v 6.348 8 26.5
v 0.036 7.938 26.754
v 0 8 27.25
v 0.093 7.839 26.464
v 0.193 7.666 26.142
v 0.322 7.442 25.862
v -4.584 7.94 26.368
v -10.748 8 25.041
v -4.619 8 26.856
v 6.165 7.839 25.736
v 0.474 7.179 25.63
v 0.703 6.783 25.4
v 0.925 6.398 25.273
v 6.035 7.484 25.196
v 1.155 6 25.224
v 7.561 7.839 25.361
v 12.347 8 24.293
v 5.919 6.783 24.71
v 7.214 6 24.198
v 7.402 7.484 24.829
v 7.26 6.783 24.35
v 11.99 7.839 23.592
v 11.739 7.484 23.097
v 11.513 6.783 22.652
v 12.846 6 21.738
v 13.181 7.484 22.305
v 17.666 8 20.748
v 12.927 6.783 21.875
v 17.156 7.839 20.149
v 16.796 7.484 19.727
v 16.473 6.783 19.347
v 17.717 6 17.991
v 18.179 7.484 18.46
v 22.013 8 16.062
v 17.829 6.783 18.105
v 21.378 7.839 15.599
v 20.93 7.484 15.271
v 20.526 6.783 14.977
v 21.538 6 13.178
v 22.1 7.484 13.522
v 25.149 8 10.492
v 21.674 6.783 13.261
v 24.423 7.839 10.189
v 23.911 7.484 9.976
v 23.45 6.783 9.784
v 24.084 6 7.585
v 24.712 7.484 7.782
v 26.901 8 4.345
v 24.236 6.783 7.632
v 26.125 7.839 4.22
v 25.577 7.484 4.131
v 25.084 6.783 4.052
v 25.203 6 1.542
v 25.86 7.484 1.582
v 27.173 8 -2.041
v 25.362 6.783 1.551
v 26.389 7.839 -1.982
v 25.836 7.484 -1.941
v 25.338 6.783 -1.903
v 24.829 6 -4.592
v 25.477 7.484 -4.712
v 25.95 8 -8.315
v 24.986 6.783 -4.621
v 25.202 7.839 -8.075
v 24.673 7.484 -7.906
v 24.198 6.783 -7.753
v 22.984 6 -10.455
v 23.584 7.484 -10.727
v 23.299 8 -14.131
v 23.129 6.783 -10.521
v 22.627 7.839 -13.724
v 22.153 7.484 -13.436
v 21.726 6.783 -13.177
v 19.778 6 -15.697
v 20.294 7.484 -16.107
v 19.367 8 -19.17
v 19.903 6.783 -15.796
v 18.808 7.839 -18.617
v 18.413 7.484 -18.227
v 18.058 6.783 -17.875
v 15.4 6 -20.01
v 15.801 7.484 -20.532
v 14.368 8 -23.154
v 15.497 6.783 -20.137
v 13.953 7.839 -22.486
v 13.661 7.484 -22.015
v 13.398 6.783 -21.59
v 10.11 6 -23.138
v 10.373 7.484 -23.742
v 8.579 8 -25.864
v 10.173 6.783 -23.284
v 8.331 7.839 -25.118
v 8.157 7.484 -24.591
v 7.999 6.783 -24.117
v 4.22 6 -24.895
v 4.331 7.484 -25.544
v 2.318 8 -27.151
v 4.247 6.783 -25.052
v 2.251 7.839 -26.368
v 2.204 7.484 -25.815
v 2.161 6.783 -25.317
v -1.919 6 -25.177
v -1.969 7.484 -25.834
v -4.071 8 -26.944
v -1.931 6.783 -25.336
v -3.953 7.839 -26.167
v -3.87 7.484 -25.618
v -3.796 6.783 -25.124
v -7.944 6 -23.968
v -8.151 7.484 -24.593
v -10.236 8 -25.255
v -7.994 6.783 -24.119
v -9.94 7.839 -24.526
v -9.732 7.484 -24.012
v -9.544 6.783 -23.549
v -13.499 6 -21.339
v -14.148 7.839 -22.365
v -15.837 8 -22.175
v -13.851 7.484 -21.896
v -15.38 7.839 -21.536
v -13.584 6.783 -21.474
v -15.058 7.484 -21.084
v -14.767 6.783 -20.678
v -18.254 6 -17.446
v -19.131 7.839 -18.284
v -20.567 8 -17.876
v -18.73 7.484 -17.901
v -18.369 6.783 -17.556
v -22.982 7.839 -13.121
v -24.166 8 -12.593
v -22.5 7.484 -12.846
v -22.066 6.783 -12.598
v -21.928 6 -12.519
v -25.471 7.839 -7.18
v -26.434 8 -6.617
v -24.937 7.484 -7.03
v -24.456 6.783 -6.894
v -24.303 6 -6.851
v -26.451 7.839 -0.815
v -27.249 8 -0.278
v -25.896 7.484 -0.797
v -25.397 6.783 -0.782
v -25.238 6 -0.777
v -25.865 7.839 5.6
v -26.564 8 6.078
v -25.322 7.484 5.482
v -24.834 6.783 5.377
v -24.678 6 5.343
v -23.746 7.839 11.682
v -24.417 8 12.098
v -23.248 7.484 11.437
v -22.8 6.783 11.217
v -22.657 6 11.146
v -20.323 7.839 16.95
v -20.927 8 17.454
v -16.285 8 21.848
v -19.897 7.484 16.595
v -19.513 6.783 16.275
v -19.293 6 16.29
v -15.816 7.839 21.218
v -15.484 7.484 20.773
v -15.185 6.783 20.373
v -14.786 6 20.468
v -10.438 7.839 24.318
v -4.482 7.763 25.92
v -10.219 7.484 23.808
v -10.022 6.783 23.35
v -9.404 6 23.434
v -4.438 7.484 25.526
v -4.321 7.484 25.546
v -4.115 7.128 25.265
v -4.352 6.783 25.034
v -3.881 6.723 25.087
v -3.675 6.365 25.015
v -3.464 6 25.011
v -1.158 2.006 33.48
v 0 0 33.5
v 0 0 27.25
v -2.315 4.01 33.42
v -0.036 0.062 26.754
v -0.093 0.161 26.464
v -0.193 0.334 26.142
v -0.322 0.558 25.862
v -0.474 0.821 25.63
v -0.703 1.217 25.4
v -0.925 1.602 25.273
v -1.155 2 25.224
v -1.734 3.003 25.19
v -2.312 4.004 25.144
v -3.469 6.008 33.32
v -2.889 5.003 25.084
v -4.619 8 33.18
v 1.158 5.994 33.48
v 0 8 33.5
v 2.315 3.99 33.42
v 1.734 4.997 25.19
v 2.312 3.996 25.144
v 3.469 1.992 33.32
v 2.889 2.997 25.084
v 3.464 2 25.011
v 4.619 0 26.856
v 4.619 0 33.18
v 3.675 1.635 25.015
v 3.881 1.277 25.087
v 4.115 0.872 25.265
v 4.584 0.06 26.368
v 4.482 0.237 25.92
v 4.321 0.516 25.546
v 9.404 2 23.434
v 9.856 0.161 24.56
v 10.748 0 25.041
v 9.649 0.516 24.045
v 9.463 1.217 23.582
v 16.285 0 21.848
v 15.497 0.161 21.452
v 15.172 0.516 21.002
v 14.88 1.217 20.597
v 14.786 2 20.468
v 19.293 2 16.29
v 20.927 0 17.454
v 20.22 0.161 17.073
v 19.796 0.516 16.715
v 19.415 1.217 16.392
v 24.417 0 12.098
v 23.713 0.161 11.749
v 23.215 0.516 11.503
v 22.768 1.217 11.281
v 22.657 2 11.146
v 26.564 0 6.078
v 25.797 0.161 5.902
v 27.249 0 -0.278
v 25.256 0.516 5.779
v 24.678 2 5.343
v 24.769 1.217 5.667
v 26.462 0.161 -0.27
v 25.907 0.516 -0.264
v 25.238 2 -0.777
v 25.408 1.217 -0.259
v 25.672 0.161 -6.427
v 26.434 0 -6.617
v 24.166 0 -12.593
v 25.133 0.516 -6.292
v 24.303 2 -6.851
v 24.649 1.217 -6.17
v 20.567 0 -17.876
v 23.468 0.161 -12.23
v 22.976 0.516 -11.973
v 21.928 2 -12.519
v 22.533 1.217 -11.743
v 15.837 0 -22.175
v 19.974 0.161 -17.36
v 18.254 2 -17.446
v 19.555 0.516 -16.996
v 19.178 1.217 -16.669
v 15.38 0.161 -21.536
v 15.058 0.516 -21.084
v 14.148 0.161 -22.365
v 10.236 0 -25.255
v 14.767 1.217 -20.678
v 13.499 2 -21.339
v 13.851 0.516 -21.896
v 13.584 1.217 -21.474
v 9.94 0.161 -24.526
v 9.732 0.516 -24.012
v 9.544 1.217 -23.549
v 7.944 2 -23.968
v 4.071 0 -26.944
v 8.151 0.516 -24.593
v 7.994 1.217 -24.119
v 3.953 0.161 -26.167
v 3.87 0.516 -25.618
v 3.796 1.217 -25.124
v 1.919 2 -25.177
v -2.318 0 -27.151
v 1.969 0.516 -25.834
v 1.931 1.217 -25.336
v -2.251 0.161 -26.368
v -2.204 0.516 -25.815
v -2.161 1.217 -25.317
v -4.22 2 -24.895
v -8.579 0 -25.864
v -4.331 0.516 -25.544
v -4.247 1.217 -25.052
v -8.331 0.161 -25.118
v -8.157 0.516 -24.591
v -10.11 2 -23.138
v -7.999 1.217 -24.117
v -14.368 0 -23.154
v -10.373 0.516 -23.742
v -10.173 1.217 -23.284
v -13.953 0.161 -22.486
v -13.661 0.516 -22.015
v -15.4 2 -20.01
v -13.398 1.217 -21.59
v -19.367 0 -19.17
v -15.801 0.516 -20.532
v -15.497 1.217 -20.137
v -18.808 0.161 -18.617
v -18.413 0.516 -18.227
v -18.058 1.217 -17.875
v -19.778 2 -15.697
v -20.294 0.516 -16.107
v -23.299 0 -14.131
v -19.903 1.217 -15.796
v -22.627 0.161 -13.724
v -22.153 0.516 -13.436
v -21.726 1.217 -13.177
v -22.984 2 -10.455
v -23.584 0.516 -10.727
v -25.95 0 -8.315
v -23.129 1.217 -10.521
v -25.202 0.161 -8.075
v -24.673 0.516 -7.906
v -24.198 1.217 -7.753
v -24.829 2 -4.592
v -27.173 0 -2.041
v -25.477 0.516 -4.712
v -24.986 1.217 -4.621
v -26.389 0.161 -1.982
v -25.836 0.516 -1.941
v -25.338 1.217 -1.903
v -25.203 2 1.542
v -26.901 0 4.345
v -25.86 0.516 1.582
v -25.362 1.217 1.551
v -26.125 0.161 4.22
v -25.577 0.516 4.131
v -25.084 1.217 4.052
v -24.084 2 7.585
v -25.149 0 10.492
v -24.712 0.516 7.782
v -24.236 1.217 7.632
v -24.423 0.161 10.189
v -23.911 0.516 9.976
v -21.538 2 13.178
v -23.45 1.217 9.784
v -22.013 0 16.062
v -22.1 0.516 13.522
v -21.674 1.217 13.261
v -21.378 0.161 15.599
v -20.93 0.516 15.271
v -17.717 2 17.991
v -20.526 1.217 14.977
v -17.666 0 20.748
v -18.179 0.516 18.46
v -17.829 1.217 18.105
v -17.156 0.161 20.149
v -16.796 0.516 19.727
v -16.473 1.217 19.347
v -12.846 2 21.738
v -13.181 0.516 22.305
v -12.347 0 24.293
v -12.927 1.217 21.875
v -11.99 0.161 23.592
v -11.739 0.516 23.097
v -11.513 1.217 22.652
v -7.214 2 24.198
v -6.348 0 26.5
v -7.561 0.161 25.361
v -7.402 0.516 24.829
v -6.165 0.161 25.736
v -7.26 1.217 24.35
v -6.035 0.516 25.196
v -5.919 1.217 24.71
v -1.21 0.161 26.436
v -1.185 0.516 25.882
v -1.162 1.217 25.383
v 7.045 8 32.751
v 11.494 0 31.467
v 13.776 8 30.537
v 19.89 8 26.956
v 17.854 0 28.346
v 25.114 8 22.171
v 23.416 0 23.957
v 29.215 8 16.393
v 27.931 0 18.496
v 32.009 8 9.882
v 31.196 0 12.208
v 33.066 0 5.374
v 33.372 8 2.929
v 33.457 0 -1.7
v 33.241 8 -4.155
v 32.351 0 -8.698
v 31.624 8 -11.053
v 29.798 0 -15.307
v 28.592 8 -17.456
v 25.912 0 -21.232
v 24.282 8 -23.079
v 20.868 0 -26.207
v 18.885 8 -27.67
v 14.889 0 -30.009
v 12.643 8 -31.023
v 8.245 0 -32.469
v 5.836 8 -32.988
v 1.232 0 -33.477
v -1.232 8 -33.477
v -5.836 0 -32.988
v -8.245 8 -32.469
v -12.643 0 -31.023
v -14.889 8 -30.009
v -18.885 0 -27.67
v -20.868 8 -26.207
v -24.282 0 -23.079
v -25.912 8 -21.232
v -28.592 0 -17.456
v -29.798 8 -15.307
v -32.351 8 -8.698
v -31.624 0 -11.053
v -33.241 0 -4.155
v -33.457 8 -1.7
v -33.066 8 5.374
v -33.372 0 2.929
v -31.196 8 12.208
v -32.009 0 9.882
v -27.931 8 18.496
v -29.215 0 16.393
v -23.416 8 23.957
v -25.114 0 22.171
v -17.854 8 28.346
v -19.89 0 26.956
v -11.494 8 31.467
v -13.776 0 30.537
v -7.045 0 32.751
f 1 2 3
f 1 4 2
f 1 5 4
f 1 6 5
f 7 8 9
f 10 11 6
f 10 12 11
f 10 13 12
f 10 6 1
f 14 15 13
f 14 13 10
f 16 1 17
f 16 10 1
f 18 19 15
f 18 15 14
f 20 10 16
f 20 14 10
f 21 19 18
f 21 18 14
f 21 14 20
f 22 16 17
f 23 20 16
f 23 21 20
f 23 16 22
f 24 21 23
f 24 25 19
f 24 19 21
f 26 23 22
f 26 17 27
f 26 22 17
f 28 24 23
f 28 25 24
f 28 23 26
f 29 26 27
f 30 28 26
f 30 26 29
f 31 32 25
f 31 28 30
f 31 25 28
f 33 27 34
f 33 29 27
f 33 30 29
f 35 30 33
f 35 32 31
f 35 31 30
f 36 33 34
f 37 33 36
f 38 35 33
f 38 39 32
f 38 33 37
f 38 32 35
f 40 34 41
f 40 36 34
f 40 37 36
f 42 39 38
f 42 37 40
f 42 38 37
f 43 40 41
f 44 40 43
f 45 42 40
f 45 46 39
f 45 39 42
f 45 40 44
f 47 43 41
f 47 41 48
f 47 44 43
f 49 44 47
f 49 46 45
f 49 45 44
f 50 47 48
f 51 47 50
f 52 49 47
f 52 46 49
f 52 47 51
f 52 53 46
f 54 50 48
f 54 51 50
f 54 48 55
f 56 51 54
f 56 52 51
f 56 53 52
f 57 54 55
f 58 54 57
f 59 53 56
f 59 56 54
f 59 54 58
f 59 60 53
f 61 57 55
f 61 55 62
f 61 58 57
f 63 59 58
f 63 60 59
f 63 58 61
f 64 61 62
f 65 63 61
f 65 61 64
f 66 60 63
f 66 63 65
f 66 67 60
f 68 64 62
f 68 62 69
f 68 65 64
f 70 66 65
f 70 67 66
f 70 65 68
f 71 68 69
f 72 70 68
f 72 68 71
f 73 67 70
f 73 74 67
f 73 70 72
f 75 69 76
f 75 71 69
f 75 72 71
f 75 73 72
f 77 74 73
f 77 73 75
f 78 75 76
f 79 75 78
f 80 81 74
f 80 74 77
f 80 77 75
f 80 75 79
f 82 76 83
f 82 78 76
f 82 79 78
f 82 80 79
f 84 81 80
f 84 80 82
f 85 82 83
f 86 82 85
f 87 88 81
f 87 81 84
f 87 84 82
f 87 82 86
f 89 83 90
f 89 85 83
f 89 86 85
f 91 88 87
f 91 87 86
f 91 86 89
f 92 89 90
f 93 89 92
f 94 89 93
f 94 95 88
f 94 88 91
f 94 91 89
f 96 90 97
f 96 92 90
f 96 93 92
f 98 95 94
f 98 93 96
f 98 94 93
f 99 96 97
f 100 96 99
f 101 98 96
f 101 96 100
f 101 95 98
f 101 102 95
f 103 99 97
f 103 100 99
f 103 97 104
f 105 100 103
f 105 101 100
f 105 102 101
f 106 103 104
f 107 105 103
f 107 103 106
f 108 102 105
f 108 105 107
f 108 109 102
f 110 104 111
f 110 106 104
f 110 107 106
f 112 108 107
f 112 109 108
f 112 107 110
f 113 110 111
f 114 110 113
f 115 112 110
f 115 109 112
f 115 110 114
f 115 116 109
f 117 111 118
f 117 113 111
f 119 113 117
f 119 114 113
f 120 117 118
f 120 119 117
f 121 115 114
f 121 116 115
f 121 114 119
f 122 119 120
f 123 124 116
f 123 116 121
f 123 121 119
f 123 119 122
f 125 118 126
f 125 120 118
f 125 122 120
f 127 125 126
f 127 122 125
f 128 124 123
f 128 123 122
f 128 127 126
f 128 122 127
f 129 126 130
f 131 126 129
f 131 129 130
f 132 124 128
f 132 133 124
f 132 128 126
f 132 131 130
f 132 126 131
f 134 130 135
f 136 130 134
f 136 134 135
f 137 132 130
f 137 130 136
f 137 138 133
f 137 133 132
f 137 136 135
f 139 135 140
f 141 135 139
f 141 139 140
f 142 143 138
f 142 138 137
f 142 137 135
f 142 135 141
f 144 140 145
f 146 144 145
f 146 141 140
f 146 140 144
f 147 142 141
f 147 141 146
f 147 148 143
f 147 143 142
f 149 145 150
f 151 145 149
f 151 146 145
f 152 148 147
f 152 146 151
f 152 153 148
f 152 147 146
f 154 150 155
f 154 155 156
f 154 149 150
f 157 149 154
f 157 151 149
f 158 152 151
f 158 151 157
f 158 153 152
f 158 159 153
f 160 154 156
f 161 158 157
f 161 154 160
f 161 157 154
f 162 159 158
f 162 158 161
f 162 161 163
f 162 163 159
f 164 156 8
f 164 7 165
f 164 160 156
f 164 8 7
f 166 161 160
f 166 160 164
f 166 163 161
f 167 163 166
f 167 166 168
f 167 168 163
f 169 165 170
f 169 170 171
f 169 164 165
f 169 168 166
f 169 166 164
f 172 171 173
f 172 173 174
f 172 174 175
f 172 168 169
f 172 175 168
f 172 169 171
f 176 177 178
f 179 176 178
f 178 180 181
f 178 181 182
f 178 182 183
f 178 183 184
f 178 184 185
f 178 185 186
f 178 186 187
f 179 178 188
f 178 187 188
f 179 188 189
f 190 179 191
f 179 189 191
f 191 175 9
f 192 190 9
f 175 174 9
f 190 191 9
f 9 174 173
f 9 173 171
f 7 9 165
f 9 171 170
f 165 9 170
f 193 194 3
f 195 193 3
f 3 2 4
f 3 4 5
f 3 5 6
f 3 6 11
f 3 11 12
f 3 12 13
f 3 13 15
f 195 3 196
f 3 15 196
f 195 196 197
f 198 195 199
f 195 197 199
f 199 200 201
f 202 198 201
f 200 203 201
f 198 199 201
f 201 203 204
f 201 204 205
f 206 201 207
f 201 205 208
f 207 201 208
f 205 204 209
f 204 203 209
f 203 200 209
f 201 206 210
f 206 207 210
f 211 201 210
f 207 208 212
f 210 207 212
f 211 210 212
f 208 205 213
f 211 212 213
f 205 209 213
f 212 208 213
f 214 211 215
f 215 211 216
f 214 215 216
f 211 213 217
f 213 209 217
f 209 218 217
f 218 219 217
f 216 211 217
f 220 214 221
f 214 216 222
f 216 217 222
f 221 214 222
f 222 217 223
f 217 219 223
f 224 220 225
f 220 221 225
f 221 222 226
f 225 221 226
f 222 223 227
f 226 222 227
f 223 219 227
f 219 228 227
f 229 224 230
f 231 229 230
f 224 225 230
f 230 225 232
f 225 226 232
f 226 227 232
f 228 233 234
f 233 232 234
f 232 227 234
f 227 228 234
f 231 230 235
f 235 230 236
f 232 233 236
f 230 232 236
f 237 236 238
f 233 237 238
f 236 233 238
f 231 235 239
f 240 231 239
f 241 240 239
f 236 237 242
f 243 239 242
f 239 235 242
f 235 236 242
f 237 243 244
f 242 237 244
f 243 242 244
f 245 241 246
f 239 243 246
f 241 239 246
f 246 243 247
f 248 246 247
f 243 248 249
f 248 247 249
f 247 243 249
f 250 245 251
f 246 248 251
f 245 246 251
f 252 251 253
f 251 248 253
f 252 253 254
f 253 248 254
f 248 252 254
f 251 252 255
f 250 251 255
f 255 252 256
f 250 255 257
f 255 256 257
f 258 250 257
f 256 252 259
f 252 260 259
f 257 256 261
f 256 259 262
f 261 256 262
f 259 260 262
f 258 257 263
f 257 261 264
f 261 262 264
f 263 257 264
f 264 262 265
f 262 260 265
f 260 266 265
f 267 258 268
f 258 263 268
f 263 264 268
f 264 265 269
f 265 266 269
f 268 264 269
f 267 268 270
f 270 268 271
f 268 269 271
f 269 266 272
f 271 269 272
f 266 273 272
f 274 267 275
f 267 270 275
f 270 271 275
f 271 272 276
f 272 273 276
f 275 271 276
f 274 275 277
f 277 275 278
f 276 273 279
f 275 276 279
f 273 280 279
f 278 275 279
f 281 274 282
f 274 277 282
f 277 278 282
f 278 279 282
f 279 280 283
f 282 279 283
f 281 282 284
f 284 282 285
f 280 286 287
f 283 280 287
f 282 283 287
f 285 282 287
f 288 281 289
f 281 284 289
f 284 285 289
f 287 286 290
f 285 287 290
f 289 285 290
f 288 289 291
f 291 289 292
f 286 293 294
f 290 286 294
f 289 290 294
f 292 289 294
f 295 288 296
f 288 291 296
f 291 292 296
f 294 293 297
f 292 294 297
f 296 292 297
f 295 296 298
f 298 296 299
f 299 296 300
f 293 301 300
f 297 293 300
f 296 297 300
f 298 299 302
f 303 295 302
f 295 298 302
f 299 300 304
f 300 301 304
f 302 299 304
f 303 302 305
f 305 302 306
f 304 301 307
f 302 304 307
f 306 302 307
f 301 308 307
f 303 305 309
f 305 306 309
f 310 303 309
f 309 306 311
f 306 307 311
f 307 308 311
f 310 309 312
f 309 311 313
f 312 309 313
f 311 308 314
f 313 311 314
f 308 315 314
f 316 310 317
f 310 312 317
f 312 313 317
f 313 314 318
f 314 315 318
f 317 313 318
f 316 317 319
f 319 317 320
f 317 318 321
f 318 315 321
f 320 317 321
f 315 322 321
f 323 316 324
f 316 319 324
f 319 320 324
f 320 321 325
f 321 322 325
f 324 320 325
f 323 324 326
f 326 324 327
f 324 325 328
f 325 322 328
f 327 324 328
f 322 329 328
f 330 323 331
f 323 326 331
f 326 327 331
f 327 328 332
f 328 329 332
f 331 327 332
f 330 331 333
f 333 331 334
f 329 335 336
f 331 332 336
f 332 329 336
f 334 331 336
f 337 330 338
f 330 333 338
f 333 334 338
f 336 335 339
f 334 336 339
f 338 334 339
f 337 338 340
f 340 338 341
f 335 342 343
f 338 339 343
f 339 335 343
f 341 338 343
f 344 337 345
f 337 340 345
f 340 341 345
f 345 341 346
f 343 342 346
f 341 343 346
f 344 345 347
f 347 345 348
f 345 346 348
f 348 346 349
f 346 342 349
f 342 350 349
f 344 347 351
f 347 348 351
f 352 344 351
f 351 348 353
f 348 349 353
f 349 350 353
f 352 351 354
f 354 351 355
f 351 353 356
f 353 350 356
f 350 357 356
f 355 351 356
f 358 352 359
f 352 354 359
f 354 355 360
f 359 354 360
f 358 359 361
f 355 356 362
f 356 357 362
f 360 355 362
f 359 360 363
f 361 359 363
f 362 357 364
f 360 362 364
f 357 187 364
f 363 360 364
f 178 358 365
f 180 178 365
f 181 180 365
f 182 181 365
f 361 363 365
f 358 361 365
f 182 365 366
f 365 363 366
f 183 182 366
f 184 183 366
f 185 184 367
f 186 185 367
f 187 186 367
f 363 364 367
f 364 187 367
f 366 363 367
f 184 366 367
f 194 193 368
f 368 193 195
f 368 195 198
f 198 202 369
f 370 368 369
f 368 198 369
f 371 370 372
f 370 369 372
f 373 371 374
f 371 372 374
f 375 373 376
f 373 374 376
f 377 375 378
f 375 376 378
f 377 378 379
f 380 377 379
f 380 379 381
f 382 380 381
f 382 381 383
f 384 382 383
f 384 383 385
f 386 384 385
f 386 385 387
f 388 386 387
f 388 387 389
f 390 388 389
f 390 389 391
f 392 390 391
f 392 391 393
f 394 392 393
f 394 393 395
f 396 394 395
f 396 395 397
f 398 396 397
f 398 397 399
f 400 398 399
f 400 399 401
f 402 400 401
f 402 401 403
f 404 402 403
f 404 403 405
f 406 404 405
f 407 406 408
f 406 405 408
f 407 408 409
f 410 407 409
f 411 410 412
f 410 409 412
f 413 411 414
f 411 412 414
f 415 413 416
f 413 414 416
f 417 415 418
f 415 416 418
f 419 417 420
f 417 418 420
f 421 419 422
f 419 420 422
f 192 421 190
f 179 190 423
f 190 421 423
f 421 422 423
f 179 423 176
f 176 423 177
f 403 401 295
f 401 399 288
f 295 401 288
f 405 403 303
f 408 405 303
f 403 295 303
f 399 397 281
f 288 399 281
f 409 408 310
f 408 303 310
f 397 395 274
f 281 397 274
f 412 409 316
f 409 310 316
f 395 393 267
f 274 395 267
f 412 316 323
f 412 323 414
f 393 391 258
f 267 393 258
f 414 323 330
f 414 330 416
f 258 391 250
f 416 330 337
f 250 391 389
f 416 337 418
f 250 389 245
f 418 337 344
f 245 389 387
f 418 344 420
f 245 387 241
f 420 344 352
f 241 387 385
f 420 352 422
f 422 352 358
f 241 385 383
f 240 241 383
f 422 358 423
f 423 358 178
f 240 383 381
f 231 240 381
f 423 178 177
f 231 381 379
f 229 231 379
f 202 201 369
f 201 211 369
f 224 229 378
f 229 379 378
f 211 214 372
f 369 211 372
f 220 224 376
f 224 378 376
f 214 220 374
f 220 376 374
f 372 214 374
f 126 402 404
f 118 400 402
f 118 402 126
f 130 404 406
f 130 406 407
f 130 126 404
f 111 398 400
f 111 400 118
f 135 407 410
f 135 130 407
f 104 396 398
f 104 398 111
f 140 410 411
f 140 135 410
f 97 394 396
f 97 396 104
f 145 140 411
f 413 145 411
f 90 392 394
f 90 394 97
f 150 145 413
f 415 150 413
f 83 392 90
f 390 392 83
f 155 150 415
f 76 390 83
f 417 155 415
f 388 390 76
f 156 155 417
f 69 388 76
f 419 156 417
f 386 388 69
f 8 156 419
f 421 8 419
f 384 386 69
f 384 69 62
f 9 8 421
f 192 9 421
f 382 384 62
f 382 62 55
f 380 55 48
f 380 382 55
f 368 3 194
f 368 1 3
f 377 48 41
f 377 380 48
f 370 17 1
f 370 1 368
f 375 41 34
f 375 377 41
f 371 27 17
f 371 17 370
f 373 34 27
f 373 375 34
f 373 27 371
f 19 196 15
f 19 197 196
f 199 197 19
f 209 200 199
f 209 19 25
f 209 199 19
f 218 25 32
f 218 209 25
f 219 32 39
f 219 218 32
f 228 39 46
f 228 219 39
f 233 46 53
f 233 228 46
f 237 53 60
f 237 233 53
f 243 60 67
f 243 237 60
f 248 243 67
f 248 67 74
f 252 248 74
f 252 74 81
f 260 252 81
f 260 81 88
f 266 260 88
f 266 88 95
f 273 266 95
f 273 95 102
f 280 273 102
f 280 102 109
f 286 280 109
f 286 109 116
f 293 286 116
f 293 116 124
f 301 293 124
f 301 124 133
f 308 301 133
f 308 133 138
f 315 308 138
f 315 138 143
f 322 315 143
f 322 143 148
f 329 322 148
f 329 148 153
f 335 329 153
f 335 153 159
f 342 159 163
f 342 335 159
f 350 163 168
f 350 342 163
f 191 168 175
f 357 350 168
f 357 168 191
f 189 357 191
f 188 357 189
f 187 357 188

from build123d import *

# Parameters (mm, degrees)
BODYSKE_R      = 33.5
BODYSKE_R_2    = 25.25
BASEBODY_DEPTH = 8
SLIT_DEPTH     = 49.046852134
FILLET1_R      = 2


with BuildPart() as part:
    # BodySke → BaseBody (new body)
    with BuildSketch(Plane(origin=(0, 0, 0), x_dir=(1, 0, 0), z_dir=(0, 1, 0))):
        with Locations(Location((0, 0, 0), (0, 0, 270))):
            Circle(BODYSKE_R)
        with Locations(Location((0, 0, 0), (0, 0, 270))):
            Circle(BODYSKE_R_2, mode=Mode.SUBTRACT)
    extrude(amount=BASEBODY_DEPTH)

    # SlitSke → Slit (cut, through all)
    with BuildSketch(Plane.XY):
        Polygon((0, 0), (-4.618802154, 8), (0, 8), (4.618802154, 0), align=None)
    extrude(amount=SLIT_DEPTH, mode=Mode.SUBTRACT)

    # Fillet1
    fillet1_edges = [part.edges().sort_by_distance(p)[0] for p in [
        (-2.319204626, 0, -25.143265299),
        (2.319204626, 8, -25.143265299),
    ]]
    fillet(fillet1_edges, radius=FILLET1_R)


solid = part.part
